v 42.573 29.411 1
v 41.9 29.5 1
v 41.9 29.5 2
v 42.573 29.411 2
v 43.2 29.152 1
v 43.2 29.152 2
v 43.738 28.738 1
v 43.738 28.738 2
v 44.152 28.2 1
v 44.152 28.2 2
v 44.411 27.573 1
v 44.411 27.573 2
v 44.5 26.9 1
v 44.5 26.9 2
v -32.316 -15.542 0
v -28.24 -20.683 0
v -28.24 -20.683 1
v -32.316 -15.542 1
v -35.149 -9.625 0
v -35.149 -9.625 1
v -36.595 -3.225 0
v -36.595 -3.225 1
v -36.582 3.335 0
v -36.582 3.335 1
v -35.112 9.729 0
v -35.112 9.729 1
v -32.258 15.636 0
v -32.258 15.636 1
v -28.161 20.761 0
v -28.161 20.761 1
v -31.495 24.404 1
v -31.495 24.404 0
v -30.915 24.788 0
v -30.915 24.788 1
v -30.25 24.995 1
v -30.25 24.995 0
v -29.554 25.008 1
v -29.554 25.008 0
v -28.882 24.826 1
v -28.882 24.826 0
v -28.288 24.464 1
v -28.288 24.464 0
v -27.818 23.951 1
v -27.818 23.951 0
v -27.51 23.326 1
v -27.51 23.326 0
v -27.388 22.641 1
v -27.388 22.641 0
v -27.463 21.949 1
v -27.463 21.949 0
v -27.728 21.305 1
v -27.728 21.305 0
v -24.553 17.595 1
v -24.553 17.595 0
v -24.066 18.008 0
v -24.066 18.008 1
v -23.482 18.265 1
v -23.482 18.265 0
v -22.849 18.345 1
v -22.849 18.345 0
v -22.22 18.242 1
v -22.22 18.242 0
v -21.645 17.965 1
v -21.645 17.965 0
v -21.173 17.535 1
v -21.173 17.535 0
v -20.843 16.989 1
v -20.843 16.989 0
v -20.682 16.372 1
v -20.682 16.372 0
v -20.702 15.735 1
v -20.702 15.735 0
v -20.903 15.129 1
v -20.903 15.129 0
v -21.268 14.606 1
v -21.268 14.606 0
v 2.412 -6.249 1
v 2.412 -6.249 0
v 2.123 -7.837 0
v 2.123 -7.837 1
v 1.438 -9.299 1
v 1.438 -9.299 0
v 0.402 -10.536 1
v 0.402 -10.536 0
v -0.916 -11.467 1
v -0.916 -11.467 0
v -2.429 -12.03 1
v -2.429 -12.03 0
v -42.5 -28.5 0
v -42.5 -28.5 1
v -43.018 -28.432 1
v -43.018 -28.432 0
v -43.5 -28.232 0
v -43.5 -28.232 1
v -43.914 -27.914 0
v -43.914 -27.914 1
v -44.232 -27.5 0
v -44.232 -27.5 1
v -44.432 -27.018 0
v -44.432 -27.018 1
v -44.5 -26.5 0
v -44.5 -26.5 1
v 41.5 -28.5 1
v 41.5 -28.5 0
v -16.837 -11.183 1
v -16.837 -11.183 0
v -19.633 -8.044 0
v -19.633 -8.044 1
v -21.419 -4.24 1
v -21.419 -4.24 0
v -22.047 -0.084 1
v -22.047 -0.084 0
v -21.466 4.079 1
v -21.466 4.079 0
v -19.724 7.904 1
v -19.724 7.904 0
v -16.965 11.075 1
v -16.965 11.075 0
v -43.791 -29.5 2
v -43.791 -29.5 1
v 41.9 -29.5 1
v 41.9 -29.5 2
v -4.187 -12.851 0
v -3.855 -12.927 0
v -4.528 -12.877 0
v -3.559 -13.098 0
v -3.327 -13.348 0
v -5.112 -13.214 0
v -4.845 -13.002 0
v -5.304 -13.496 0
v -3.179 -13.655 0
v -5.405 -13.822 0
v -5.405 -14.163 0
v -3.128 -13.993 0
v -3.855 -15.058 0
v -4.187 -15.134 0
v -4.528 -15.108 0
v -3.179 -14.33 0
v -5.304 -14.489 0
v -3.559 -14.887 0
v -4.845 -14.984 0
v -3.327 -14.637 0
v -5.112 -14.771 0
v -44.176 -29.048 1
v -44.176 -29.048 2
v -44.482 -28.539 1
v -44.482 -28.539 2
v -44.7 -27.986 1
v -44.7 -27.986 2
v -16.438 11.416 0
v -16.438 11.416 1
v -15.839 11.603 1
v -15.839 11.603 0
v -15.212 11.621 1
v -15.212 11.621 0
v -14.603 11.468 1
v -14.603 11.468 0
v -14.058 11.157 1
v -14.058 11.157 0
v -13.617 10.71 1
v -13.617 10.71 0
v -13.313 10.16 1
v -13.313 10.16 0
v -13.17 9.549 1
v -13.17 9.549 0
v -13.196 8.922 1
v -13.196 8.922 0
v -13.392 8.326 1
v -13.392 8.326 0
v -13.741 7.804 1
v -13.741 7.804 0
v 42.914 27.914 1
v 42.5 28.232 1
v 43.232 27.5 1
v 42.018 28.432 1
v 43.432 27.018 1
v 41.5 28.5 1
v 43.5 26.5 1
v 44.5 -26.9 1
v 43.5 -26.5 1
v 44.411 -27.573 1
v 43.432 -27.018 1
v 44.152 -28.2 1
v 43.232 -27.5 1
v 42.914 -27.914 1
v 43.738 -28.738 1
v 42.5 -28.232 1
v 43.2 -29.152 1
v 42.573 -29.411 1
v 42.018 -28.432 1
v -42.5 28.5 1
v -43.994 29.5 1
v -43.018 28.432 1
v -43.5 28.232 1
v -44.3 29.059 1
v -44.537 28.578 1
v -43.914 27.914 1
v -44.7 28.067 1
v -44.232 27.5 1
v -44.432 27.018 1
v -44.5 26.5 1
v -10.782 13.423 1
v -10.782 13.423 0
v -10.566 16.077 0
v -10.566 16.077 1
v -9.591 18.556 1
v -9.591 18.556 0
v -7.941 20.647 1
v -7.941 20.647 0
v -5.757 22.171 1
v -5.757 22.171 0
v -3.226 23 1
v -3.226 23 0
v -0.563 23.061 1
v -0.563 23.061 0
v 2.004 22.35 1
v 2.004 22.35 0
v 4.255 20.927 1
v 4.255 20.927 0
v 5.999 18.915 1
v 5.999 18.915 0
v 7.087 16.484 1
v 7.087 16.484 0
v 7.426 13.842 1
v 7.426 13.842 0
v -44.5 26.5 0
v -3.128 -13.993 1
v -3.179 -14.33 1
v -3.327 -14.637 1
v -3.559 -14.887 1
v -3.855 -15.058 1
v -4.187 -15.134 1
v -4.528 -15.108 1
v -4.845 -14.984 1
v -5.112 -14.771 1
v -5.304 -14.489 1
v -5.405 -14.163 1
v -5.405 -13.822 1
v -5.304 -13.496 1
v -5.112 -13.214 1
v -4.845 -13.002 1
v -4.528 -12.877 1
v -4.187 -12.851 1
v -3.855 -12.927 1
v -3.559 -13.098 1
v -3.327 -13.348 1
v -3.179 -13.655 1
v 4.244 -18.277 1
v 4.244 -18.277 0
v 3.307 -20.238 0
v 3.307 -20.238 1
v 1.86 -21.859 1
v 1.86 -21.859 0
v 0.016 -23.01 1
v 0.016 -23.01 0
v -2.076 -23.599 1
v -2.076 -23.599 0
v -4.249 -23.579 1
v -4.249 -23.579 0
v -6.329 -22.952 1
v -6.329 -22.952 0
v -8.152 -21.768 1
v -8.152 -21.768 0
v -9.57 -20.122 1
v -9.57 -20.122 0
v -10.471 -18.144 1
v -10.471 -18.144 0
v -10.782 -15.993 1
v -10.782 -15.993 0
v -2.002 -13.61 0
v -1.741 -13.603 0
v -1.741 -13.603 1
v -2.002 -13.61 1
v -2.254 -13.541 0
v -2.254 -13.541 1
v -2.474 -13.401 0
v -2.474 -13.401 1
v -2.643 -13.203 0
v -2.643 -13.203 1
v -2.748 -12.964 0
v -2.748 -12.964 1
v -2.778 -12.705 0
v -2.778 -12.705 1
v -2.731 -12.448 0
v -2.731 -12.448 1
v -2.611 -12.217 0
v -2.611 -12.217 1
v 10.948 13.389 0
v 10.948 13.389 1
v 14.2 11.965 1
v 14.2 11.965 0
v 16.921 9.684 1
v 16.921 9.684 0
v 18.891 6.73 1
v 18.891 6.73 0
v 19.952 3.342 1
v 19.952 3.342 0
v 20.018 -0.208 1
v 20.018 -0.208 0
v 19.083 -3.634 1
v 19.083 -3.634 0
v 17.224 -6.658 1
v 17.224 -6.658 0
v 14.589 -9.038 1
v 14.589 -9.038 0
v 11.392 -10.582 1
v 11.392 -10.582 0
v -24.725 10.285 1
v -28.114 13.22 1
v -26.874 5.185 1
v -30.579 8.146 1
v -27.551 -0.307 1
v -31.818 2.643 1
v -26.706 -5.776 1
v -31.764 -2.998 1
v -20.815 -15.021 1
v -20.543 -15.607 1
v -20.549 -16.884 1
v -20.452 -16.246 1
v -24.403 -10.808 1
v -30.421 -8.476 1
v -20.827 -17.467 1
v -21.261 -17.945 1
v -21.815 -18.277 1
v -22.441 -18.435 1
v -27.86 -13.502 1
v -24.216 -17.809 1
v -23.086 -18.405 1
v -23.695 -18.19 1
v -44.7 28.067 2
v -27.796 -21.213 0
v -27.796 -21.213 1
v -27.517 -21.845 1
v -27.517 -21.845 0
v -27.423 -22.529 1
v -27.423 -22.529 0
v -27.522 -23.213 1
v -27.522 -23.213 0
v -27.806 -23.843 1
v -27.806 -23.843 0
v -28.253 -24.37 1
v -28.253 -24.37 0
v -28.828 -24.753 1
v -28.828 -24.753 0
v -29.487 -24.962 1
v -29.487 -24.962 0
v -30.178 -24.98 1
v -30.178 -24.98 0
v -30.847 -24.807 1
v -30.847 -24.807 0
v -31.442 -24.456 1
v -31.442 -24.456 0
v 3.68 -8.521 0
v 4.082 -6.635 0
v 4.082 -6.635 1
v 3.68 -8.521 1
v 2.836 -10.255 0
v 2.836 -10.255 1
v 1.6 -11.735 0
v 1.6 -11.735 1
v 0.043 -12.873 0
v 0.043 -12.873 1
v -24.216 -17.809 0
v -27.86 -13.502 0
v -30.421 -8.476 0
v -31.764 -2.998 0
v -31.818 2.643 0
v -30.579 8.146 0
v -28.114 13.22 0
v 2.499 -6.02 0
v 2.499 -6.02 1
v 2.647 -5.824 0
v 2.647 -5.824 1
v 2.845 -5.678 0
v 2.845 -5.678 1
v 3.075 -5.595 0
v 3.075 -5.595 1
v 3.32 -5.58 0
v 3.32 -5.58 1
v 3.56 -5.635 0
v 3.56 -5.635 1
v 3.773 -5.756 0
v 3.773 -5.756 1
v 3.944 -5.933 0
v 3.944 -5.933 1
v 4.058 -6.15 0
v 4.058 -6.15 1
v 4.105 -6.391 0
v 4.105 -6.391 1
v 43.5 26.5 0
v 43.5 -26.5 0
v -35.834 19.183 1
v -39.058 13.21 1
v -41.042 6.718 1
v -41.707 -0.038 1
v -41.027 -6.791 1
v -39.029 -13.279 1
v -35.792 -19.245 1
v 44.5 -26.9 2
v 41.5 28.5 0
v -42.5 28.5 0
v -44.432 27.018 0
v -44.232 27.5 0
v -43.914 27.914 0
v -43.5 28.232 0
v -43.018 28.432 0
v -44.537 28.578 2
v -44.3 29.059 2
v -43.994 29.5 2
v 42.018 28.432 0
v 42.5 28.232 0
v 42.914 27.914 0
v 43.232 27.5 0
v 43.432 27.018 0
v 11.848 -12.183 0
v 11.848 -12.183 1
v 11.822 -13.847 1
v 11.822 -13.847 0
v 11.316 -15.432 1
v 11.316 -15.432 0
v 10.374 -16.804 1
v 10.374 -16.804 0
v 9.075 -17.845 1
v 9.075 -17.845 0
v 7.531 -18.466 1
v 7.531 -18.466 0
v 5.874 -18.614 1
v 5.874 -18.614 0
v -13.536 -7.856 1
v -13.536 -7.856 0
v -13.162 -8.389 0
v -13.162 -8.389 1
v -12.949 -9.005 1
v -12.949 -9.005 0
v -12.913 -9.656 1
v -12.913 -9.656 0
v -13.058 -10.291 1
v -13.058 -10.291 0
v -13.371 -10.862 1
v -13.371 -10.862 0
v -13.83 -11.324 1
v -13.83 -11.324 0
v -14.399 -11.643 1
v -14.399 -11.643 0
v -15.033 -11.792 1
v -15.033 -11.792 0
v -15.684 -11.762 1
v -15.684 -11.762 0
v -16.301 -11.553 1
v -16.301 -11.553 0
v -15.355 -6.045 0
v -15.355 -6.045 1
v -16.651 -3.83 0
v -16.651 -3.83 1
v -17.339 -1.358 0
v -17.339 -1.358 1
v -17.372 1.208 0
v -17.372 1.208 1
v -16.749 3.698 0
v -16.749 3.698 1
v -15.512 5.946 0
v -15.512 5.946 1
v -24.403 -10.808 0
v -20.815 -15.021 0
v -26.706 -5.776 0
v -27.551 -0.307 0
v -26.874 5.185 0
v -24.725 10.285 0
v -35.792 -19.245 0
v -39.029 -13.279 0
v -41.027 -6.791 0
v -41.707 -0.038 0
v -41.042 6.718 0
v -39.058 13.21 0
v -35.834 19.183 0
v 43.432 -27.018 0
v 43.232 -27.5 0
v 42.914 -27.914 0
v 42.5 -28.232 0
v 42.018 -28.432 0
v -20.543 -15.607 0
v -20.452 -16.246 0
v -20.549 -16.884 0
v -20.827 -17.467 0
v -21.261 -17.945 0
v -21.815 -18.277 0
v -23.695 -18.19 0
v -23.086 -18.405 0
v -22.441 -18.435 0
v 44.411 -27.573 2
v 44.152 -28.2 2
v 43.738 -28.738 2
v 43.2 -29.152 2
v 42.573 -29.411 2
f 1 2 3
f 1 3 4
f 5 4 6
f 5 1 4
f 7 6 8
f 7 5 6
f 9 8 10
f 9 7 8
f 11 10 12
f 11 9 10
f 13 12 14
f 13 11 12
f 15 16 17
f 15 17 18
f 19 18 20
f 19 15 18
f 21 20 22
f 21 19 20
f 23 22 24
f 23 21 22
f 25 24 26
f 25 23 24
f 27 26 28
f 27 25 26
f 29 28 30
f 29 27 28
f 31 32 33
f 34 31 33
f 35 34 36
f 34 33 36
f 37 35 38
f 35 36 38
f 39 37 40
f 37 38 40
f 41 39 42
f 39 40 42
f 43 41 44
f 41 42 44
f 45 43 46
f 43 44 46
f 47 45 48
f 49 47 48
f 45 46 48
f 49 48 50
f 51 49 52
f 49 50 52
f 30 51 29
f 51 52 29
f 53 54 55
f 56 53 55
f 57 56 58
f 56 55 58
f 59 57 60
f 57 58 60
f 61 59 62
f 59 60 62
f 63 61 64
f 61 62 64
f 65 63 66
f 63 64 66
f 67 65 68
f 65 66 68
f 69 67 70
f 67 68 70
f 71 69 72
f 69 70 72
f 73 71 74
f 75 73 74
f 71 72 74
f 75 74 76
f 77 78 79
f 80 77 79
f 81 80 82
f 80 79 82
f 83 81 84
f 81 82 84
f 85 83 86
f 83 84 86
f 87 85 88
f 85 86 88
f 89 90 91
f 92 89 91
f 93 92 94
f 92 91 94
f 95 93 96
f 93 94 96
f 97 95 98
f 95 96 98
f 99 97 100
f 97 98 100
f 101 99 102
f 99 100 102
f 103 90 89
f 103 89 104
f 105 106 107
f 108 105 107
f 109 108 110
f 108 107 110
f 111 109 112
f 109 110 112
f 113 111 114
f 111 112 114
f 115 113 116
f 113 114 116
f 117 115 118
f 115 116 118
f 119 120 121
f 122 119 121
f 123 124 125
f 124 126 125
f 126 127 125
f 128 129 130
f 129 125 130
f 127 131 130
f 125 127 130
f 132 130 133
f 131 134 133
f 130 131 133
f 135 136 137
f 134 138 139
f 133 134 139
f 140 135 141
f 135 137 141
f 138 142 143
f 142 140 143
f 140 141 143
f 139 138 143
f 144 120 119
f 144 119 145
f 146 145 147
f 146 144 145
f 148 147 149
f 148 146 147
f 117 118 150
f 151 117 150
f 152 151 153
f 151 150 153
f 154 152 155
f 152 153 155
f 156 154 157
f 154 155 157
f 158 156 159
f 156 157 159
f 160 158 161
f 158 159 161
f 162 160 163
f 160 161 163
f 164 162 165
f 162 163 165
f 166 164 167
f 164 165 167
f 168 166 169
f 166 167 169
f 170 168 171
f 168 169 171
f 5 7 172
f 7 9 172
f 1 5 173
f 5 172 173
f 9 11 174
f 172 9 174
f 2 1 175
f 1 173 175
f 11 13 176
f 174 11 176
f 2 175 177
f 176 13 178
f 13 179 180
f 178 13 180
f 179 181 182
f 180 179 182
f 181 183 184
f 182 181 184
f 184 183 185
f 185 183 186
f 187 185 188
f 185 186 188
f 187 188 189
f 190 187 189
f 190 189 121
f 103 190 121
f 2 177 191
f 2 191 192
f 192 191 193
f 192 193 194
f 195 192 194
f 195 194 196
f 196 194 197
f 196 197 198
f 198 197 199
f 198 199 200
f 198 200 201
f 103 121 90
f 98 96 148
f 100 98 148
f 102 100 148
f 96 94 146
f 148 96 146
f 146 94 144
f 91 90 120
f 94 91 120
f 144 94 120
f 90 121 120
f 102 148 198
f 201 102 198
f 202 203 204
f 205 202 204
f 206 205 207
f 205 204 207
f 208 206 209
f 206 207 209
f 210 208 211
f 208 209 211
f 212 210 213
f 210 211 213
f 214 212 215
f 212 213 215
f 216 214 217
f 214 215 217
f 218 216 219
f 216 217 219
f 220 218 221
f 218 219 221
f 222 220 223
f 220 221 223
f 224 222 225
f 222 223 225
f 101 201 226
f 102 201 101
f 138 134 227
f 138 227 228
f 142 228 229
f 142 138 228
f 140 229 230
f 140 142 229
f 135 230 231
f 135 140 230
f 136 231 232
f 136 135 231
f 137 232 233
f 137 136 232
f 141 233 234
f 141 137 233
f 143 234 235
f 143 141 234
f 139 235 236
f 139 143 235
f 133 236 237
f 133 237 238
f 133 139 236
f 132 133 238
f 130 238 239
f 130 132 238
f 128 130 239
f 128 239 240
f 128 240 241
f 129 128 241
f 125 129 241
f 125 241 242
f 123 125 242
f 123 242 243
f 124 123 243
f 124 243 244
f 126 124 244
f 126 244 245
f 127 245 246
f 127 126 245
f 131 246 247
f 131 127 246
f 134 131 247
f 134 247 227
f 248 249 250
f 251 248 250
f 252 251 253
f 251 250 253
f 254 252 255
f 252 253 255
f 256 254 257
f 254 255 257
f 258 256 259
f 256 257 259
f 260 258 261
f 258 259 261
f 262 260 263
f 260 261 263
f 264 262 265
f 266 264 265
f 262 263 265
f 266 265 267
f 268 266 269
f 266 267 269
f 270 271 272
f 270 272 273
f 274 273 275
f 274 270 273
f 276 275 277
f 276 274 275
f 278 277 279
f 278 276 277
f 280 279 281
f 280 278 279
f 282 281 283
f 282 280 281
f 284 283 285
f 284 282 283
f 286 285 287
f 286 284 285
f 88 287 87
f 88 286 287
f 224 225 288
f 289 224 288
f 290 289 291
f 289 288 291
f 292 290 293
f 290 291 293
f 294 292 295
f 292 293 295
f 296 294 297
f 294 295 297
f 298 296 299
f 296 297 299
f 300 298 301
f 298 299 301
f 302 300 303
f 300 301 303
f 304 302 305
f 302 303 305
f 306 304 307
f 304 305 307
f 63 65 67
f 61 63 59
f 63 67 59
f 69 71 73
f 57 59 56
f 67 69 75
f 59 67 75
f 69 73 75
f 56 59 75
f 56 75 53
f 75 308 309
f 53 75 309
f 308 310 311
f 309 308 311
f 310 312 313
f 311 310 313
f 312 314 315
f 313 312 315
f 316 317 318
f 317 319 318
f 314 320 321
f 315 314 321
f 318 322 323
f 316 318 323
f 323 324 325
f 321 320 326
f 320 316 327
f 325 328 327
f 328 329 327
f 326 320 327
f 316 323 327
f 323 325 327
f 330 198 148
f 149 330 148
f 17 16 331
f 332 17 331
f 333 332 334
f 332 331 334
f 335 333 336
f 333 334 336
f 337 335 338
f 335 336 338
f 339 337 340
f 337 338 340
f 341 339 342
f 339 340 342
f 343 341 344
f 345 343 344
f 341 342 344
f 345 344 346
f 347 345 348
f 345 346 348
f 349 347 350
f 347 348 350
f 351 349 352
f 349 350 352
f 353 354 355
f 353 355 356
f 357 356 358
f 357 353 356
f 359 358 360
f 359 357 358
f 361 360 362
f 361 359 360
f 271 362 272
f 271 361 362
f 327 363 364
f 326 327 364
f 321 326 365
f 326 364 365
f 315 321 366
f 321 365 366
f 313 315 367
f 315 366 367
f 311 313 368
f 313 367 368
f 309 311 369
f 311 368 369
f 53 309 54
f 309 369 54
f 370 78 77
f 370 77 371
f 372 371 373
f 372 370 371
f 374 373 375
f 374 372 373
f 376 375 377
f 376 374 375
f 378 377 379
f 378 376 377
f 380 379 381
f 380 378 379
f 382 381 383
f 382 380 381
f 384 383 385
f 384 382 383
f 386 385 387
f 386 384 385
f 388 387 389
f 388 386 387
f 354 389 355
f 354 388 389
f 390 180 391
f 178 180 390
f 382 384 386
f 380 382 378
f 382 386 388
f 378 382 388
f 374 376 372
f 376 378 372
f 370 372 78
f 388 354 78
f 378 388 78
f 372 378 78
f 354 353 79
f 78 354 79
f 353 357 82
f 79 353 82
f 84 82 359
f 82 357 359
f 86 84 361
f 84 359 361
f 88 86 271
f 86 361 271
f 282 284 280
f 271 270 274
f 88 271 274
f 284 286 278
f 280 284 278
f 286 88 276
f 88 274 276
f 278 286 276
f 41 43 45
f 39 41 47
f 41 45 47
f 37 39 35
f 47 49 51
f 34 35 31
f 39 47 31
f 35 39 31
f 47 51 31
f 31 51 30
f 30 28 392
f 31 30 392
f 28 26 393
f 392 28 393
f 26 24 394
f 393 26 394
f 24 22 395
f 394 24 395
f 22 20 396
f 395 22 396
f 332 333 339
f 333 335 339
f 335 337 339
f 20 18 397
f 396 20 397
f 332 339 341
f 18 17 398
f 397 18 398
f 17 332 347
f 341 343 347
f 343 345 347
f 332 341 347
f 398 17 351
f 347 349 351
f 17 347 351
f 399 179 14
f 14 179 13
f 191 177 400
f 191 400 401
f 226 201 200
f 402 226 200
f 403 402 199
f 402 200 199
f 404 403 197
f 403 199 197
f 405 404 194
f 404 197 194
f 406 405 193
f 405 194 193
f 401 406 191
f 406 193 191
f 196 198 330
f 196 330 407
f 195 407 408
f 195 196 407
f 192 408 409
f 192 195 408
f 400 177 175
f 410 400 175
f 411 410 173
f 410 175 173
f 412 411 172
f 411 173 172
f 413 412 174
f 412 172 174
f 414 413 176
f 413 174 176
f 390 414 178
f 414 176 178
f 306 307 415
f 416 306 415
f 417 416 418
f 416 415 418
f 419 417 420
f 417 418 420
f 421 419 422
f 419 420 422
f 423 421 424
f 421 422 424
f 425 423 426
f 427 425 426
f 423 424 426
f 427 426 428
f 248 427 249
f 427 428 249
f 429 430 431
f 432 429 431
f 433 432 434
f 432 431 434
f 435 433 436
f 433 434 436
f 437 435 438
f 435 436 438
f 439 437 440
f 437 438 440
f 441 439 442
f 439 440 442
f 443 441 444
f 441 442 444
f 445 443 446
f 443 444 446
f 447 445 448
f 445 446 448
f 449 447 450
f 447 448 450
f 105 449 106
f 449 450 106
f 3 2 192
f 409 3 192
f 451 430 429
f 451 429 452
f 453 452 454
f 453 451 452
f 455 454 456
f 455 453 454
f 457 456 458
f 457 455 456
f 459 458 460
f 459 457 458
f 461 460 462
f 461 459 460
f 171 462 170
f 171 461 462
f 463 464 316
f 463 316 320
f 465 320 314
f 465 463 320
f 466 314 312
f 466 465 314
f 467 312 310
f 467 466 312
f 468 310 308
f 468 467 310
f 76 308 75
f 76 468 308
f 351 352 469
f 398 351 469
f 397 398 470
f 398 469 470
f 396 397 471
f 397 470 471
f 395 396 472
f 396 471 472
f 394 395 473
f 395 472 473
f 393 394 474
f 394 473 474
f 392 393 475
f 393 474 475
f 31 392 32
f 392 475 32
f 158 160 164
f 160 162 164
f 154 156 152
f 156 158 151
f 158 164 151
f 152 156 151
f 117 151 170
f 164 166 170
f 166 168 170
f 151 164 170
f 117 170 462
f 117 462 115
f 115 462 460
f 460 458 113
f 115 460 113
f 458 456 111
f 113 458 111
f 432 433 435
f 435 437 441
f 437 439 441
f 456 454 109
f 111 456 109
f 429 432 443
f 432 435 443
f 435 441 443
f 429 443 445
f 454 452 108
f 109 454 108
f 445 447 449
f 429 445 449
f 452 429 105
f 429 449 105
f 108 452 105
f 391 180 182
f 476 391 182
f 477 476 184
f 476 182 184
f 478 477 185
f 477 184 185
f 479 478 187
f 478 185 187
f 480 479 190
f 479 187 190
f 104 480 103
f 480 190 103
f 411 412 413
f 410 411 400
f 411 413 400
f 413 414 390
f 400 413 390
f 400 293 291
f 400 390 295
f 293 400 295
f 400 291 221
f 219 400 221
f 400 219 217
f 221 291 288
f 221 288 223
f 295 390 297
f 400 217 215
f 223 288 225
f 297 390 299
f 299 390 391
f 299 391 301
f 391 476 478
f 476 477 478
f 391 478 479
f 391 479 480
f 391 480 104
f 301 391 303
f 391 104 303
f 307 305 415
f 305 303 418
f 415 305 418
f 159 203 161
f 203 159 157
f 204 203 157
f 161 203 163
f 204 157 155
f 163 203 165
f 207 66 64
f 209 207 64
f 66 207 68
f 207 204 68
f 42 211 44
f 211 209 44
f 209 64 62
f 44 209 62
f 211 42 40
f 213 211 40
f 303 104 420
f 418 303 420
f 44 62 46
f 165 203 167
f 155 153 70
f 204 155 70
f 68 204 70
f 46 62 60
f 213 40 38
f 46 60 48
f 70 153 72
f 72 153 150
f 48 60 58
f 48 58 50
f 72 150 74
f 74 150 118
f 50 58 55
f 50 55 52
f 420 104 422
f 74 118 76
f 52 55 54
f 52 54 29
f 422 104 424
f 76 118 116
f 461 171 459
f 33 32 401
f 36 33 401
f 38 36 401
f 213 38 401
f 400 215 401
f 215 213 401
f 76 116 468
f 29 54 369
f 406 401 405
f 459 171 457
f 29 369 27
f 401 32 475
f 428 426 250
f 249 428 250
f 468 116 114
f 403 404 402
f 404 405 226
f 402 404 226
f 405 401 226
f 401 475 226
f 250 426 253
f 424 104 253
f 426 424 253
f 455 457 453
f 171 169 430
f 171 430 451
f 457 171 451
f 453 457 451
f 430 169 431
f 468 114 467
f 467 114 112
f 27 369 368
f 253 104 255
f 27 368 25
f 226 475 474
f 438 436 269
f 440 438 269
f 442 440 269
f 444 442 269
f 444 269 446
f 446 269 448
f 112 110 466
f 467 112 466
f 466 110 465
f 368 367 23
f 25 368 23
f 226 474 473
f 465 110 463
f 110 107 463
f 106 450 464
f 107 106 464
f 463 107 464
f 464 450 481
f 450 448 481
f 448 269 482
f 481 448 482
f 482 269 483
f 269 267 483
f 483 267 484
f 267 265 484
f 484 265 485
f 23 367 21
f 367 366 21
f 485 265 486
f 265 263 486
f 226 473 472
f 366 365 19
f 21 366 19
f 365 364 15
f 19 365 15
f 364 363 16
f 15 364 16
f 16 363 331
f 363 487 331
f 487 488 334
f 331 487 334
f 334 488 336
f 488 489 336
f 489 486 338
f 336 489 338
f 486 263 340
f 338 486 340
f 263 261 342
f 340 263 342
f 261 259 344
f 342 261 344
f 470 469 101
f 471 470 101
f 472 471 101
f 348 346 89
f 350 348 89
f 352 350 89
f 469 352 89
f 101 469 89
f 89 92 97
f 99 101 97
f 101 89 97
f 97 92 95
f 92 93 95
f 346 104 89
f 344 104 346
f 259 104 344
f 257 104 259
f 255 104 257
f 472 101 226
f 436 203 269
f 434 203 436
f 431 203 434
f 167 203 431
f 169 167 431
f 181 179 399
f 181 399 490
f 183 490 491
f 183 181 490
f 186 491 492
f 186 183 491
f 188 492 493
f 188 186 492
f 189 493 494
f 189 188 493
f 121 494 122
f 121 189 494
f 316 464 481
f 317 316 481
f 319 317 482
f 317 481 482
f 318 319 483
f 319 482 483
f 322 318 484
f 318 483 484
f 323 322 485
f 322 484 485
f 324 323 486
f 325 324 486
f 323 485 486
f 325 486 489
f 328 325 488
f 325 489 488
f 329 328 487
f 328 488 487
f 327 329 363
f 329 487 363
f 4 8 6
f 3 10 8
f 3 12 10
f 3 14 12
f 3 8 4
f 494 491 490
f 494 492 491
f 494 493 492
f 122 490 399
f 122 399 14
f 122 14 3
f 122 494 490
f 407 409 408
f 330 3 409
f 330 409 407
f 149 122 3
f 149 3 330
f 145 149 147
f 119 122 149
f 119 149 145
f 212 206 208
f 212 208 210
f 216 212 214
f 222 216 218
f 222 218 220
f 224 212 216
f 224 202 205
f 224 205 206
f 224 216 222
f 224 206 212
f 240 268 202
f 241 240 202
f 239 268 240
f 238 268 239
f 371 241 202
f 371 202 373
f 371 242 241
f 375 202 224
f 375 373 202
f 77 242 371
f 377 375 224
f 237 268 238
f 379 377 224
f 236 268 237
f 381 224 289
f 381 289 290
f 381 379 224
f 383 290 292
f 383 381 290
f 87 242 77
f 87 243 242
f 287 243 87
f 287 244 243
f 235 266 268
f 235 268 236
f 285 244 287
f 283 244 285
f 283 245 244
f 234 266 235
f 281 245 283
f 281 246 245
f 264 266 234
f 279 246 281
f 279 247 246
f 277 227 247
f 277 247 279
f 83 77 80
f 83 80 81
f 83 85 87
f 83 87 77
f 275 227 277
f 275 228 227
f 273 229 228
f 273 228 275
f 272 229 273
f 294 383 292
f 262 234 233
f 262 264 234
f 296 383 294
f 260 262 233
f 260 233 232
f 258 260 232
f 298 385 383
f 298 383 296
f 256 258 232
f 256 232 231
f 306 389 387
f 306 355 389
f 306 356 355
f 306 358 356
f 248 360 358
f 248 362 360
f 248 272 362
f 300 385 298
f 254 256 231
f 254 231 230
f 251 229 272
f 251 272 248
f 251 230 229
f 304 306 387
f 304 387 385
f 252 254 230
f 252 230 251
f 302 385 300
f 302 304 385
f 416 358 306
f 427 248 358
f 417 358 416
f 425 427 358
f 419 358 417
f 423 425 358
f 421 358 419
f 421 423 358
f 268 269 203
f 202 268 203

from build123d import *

# Parameters (mm, degrees)
PAD001_DEPTH    = 1
PAD008_DEPTH    = 1
SKETCH028_R     = 1.144433
POCKET014_DEPTH = 1


with BuildPart() as part:
    # Sketch013 → Pad001 (new body)
    with BuildSketch(Plane(origin=(0, 0, 1), x_dir=(1, 0, 0), z_dir=(0, 0, -1))):
        with BuildLine():
            Line((-43.791128, 29.5), (41.9, 29.5))
            ThreePointArc((44.5, 26.9), (43.738478, 28.738478), (41.9, 29.5))
            Line((44.5, 26.9), (44.5, -8))
            Line((44.5, -8), (44.5, -26.9))
            ThreePointArc((41.9, -29.5), (43.738478, -28.738478), (44.5, -26.9))
            Line((41.9, -29.5), (-43.993837, -29.5))
            ThreePointArc((-44.7, -28.066977), (-44.427413, -28.823154), (-43.993837, -29.5))
            Line((-44.7, -28.066977), (-44.7, 27.986088))
            ThreePointArc((-43.791128, 29.5), (-44.339824, 28.799633), (-44.7, 27.986088))
        make_face()
    extrude(amount=-PAD001_DEPTH)

    # Sketch (on Face8 of Pad001) → Pad008 (join)
    with BuildSketch(Plane(origin=(0, 0, 1), x_dir=(1, 0, 0), z_dir=(0, 0, -1))):
        with BuildLine():
            Line((-42.5, 28.5), (41.5, 28.5))
            ThreePointArc((43.5, 26.5), (42.914214, 27.914214), (41.5, 28.5))
            Line((43.5, 26.5), (43.5, -26.5))
            ThreePointArc((41.5, -28.5), (42.914214, -27.914214), (43.5, -26.5))
            Line((41.5, -28.5), (-42.5, -28.5))
            ThreePointArc((-44.5, -26.5), (-43.914214, -27.914214), (-42.5, -28.5))
            Line((-44.5, -26.5), (-44.5, 26.5))
            ThreePointArc((-42.5, 28.5), (-43.914214, 27.914214), (-44.5, 26.5))
        make_face()
    extrude(amount=PAD008_DEPTH)

    # Sketch028 (on Face19 of Pad008) → Pocket014 (cut)
    with BuildSketch(Plane(origin=(0, 0, 0), x_dir=(1, 0, 0), z_dir=(0, 0, -1))):
        with BuildLine():
            ThreePointArc((-28.239604, 20.682525), (-36.772568, -0.055356), (-28.16139, -20.760883))
            ThreePointArc((-31.495352, -24.403687), (-28.034523, -24.224048), (-28.16139, -20.760883))
            ThreePointArc((-31.441869, 24.45629), (-41.706794, 0.037508), (-31.495352, -24.403687))
            ThreePointArc((-28.239604, 20.682525), (-28.010921, 24.122116), (-31.441869, 24.45629))
        make_face()
        with BuildLine():
            ThreePointArc((-20.815283, 15.021339), (-27.551042, 0.307322), (-21.268036, -14.605646))
            ThreePointArc((-24.552994, -17.595228), (-21.393816, -17.766988), (-21.268036, -14.605646))
            ThreePointArc((-24.215721, 17.808685), (-31.954171, 0.178842), (-24.552994, -17.595228))
            ThreePointArc((-20.815283, 15.021339), (-21.261111, 17.945313), (-24.215721, 17.808685))
        make_face()
        with BuildLine():
            ThreePointArc((-13.536319, 7.856117), (-17.438434, 0.075734), (-13.740768, -7.803868))
            ThreePointArc((-16.96495, -11.074563), (-13.821902, -10.948401), (-13.740768, -7.803868))
            ThreePointArc((-16.837212, 11.183151), (-22.04722, 0.083828), (-16.96495, -11.074563))
            ThreePointArc((-13.536319, 7.856117), (-13.584742, 11.10907), (-16.837212, 11.183151))
        make_face()
        with BuildLine():
            ThreePointArc((4.243843, 18.27707), (-4.248678, 23.579205), (-10.782384, 15.993281))
            Line((-10.782384, 15.993281), (-10.782384, -13.42268))
            ThreePointArc((-10.782384, -13.42268), (-1.89675, -23.128113), (7.426263, -13.842029))
            ThreePointArc((7.426263, -13.842029), (19.95175, -3.341626), (11.392084, 10.582396))
            ThreePointArc((11.392084, 10.582396), (10.373826, 16.804092), (4.243843, 18.27707))
        make_face()
        with Locations((-4.272868, 13.992623)):
            Circle(SKETCH028_R, mode=Mode.SUBTRACT)
        with BuildLine():
            ThreePointArc((2.411883, 6.249422), (0.960031, 9.950894), (-2.428904, 12.030293))
            ThreePointArc((-1.741453, 13.60297), (-2.704463, 13.087334), (-2.428904, 12.030293))
            ThreePointArc((4.082151, 6.635487), (2.262958, 11.03246), (-1.741453, 13.60297))
            ThreePointArc((2.411883, 6.249422), (3.441947, 5.599114), (4.082151, 6.635487))
        make_face(mode=Mode.SUBTRACT)
    extrude(amount=-POCKET014_DEPTH, mode=Mode.SUBTRACT)


solid = part.part
